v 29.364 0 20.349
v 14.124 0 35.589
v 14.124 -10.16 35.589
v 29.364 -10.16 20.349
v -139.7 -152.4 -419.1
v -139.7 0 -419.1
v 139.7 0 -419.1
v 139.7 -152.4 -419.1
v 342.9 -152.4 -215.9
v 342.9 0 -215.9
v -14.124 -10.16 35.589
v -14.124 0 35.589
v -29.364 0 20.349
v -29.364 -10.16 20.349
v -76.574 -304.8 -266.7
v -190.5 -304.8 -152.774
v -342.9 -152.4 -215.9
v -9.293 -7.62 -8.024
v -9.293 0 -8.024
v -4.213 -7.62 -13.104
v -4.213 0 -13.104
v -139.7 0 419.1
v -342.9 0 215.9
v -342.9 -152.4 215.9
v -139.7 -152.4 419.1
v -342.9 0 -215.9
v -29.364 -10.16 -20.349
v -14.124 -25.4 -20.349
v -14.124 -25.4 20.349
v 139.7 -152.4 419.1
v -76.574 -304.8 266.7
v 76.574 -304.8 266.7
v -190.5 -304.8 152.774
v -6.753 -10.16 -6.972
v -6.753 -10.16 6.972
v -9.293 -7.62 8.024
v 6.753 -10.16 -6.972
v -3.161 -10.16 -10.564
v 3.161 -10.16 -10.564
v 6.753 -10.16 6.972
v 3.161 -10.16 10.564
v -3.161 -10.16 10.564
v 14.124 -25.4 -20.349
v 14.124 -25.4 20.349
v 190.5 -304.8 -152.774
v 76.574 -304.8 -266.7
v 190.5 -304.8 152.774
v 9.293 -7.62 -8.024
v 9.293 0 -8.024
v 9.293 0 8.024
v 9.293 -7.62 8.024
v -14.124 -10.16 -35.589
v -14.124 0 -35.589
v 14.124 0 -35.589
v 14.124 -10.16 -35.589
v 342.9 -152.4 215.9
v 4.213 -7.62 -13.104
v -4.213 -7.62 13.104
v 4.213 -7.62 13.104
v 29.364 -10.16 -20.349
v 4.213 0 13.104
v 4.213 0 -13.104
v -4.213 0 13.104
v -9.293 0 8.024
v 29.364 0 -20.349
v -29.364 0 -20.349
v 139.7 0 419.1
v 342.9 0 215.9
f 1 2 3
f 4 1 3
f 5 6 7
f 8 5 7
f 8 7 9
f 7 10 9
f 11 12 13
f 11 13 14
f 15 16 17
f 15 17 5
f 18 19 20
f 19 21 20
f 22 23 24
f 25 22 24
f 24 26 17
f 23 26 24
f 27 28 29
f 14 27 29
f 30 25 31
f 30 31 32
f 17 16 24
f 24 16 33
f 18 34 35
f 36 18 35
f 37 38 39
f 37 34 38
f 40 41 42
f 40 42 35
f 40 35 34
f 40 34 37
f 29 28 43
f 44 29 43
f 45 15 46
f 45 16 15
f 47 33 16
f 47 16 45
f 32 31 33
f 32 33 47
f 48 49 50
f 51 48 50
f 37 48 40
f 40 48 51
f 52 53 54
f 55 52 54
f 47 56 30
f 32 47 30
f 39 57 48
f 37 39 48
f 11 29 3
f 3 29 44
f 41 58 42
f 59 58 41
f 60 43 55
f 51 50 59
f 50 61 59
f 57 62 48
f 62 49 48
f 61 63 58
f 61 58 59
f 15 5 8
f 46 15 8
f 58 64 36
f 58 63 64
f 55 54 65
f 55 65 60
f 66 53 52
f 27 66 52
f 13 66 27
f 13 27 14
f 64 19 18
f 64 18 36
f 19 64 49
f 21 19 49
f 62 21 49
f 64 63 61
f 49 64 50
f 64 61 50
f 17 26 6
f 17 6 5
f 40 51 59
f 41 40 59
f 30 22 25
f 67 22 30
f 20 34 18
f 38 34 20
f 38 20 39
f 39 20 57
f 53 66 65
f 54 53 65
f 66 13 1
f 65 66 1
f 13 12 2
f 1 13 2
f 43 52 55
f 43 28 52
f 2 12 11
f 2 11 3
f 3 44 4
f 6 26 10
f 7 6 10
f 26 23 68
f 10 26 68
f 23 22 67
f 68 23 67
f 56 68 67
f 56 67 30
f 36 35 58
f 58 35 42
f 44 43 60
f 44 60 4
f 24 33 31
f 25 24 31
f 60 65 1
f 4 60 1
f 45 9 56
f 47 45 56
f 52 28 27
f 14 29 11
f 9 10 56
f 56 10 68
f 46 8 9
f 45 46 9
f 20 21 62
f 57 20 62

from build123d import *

# Parameters (mm, degrees)
F0_W     = 58.72801
F0_H     = 71.178346
F1_DEPTH = 25.4
F2_SIZE  = 15.24
F3_W     = 685.8
F3_H     = 838.2
F4_DEPTH = 304.8
F5_SIZE  = 203.2
F6_SIZE  = 152.4
F7_W     = 18.585406
F7_H     = 26.208304
F8_DEPTH = 10.16
F9_SIZE  = 5.08
F10_SIZE = 2.54


with BuildPart() as f1:
    # F0 (on Front) → F1 (new body)
    with BuildSketch(Plane.XZ):
        Rectangle(F0_W, F0_H)
    extrude(amount=F1_DEPTH)

    # F2
    f2_edges = [f1.edges().sort_by_distance(p)[0] for p in [
        (0, -25.4, -35.589173),
        (29.364005, -25.4, 0),
        (0, -25.4, 35.589173),
        (-29.364005, -25.4, 0),
        (29.364005, -12.7, -35.589173),
        (-29.364005, -12.7, -35.589173),
        (-29.364005, -12.7, 35.589173),
        (29.364005, -12.7, 35.589173),
    ]]
    chamfer(f2_edges, length=F2_SIZE)


with BuildPart() as f4:
    # F3 (on Front) → F4 (new body)
    with BuildSketch(Plane.XZ):
        Rectangle(F3_W, F3_H)
    extrude(amount=F4_DEPTH)

    # F5
    f5_edges = [f4.edges().sort_by_distance(p)[0] for p in [
        (342.9, -152.4, 419.1),
        (342.9, -152.4, -419.1),
        (-342.9, -152.4, -419.1),
        (-342.9, -152.4, 419.1),
    ]]
    chamfer(f5_edges, length=F5_SIZE)

    # F6
    f6_edges = [f4.edges().sort_by_distance(p)[0] for p in [
        (0, -304.8, -419.1),
        (-241.3, -304.8, -317.5),
        (241.3, -304.8, -317.5),
        (-342.9, -304.8, 0),
        (342.9, -304.8, 0),
        (-241.3, -304.8, 317.5),
        (241.3, -304.8, 317.5),
        (0, -304.8, 419.1),
    ]]
    chamfer(f6_edges, length=F6_SIZE)


with BuildPart() as f8:
    # F7 (on Front) → F8 (new body)
    with BuildSketch(Plane.XZ):
        Rectangle(F7_W, F7_H)
    extrude(amount=F8_DEPTH)

    # F9
    f9_edges = [f8.edges().sort_by_distance(p)[0] for p in [
        (-9.292703, -5.08, 13.104152),
        (9.292703, -5.08, 13.104152),
        (-9.292703, -5.08, -13.104152),
        (9.292703, -5.08, -13.104152),
    ]]
    chamfer(f9_edges, length=F9_SIZE)

    # F10
    f10_edges = [f8.edges().sort_by_distance(p)[0] for p in [
        (0, -10.16, -13.104152),
        (-6.752703, -10.16, -10.564152),
        (6.752703, -10.16, -10.564152),
        (-9.292703, -10.16, 0),
        (9.292703, -10.16, 0),
        (-6.752703, -10.16, 10.564152),
        (6.752703, -10.16, 10.564152),
        (0, -10.16, 13.104152),
    ]]
    chamfer(f10_edges, length=F10_SIZE)


solid = Compound([f1.part, f4.part, f8.part])
